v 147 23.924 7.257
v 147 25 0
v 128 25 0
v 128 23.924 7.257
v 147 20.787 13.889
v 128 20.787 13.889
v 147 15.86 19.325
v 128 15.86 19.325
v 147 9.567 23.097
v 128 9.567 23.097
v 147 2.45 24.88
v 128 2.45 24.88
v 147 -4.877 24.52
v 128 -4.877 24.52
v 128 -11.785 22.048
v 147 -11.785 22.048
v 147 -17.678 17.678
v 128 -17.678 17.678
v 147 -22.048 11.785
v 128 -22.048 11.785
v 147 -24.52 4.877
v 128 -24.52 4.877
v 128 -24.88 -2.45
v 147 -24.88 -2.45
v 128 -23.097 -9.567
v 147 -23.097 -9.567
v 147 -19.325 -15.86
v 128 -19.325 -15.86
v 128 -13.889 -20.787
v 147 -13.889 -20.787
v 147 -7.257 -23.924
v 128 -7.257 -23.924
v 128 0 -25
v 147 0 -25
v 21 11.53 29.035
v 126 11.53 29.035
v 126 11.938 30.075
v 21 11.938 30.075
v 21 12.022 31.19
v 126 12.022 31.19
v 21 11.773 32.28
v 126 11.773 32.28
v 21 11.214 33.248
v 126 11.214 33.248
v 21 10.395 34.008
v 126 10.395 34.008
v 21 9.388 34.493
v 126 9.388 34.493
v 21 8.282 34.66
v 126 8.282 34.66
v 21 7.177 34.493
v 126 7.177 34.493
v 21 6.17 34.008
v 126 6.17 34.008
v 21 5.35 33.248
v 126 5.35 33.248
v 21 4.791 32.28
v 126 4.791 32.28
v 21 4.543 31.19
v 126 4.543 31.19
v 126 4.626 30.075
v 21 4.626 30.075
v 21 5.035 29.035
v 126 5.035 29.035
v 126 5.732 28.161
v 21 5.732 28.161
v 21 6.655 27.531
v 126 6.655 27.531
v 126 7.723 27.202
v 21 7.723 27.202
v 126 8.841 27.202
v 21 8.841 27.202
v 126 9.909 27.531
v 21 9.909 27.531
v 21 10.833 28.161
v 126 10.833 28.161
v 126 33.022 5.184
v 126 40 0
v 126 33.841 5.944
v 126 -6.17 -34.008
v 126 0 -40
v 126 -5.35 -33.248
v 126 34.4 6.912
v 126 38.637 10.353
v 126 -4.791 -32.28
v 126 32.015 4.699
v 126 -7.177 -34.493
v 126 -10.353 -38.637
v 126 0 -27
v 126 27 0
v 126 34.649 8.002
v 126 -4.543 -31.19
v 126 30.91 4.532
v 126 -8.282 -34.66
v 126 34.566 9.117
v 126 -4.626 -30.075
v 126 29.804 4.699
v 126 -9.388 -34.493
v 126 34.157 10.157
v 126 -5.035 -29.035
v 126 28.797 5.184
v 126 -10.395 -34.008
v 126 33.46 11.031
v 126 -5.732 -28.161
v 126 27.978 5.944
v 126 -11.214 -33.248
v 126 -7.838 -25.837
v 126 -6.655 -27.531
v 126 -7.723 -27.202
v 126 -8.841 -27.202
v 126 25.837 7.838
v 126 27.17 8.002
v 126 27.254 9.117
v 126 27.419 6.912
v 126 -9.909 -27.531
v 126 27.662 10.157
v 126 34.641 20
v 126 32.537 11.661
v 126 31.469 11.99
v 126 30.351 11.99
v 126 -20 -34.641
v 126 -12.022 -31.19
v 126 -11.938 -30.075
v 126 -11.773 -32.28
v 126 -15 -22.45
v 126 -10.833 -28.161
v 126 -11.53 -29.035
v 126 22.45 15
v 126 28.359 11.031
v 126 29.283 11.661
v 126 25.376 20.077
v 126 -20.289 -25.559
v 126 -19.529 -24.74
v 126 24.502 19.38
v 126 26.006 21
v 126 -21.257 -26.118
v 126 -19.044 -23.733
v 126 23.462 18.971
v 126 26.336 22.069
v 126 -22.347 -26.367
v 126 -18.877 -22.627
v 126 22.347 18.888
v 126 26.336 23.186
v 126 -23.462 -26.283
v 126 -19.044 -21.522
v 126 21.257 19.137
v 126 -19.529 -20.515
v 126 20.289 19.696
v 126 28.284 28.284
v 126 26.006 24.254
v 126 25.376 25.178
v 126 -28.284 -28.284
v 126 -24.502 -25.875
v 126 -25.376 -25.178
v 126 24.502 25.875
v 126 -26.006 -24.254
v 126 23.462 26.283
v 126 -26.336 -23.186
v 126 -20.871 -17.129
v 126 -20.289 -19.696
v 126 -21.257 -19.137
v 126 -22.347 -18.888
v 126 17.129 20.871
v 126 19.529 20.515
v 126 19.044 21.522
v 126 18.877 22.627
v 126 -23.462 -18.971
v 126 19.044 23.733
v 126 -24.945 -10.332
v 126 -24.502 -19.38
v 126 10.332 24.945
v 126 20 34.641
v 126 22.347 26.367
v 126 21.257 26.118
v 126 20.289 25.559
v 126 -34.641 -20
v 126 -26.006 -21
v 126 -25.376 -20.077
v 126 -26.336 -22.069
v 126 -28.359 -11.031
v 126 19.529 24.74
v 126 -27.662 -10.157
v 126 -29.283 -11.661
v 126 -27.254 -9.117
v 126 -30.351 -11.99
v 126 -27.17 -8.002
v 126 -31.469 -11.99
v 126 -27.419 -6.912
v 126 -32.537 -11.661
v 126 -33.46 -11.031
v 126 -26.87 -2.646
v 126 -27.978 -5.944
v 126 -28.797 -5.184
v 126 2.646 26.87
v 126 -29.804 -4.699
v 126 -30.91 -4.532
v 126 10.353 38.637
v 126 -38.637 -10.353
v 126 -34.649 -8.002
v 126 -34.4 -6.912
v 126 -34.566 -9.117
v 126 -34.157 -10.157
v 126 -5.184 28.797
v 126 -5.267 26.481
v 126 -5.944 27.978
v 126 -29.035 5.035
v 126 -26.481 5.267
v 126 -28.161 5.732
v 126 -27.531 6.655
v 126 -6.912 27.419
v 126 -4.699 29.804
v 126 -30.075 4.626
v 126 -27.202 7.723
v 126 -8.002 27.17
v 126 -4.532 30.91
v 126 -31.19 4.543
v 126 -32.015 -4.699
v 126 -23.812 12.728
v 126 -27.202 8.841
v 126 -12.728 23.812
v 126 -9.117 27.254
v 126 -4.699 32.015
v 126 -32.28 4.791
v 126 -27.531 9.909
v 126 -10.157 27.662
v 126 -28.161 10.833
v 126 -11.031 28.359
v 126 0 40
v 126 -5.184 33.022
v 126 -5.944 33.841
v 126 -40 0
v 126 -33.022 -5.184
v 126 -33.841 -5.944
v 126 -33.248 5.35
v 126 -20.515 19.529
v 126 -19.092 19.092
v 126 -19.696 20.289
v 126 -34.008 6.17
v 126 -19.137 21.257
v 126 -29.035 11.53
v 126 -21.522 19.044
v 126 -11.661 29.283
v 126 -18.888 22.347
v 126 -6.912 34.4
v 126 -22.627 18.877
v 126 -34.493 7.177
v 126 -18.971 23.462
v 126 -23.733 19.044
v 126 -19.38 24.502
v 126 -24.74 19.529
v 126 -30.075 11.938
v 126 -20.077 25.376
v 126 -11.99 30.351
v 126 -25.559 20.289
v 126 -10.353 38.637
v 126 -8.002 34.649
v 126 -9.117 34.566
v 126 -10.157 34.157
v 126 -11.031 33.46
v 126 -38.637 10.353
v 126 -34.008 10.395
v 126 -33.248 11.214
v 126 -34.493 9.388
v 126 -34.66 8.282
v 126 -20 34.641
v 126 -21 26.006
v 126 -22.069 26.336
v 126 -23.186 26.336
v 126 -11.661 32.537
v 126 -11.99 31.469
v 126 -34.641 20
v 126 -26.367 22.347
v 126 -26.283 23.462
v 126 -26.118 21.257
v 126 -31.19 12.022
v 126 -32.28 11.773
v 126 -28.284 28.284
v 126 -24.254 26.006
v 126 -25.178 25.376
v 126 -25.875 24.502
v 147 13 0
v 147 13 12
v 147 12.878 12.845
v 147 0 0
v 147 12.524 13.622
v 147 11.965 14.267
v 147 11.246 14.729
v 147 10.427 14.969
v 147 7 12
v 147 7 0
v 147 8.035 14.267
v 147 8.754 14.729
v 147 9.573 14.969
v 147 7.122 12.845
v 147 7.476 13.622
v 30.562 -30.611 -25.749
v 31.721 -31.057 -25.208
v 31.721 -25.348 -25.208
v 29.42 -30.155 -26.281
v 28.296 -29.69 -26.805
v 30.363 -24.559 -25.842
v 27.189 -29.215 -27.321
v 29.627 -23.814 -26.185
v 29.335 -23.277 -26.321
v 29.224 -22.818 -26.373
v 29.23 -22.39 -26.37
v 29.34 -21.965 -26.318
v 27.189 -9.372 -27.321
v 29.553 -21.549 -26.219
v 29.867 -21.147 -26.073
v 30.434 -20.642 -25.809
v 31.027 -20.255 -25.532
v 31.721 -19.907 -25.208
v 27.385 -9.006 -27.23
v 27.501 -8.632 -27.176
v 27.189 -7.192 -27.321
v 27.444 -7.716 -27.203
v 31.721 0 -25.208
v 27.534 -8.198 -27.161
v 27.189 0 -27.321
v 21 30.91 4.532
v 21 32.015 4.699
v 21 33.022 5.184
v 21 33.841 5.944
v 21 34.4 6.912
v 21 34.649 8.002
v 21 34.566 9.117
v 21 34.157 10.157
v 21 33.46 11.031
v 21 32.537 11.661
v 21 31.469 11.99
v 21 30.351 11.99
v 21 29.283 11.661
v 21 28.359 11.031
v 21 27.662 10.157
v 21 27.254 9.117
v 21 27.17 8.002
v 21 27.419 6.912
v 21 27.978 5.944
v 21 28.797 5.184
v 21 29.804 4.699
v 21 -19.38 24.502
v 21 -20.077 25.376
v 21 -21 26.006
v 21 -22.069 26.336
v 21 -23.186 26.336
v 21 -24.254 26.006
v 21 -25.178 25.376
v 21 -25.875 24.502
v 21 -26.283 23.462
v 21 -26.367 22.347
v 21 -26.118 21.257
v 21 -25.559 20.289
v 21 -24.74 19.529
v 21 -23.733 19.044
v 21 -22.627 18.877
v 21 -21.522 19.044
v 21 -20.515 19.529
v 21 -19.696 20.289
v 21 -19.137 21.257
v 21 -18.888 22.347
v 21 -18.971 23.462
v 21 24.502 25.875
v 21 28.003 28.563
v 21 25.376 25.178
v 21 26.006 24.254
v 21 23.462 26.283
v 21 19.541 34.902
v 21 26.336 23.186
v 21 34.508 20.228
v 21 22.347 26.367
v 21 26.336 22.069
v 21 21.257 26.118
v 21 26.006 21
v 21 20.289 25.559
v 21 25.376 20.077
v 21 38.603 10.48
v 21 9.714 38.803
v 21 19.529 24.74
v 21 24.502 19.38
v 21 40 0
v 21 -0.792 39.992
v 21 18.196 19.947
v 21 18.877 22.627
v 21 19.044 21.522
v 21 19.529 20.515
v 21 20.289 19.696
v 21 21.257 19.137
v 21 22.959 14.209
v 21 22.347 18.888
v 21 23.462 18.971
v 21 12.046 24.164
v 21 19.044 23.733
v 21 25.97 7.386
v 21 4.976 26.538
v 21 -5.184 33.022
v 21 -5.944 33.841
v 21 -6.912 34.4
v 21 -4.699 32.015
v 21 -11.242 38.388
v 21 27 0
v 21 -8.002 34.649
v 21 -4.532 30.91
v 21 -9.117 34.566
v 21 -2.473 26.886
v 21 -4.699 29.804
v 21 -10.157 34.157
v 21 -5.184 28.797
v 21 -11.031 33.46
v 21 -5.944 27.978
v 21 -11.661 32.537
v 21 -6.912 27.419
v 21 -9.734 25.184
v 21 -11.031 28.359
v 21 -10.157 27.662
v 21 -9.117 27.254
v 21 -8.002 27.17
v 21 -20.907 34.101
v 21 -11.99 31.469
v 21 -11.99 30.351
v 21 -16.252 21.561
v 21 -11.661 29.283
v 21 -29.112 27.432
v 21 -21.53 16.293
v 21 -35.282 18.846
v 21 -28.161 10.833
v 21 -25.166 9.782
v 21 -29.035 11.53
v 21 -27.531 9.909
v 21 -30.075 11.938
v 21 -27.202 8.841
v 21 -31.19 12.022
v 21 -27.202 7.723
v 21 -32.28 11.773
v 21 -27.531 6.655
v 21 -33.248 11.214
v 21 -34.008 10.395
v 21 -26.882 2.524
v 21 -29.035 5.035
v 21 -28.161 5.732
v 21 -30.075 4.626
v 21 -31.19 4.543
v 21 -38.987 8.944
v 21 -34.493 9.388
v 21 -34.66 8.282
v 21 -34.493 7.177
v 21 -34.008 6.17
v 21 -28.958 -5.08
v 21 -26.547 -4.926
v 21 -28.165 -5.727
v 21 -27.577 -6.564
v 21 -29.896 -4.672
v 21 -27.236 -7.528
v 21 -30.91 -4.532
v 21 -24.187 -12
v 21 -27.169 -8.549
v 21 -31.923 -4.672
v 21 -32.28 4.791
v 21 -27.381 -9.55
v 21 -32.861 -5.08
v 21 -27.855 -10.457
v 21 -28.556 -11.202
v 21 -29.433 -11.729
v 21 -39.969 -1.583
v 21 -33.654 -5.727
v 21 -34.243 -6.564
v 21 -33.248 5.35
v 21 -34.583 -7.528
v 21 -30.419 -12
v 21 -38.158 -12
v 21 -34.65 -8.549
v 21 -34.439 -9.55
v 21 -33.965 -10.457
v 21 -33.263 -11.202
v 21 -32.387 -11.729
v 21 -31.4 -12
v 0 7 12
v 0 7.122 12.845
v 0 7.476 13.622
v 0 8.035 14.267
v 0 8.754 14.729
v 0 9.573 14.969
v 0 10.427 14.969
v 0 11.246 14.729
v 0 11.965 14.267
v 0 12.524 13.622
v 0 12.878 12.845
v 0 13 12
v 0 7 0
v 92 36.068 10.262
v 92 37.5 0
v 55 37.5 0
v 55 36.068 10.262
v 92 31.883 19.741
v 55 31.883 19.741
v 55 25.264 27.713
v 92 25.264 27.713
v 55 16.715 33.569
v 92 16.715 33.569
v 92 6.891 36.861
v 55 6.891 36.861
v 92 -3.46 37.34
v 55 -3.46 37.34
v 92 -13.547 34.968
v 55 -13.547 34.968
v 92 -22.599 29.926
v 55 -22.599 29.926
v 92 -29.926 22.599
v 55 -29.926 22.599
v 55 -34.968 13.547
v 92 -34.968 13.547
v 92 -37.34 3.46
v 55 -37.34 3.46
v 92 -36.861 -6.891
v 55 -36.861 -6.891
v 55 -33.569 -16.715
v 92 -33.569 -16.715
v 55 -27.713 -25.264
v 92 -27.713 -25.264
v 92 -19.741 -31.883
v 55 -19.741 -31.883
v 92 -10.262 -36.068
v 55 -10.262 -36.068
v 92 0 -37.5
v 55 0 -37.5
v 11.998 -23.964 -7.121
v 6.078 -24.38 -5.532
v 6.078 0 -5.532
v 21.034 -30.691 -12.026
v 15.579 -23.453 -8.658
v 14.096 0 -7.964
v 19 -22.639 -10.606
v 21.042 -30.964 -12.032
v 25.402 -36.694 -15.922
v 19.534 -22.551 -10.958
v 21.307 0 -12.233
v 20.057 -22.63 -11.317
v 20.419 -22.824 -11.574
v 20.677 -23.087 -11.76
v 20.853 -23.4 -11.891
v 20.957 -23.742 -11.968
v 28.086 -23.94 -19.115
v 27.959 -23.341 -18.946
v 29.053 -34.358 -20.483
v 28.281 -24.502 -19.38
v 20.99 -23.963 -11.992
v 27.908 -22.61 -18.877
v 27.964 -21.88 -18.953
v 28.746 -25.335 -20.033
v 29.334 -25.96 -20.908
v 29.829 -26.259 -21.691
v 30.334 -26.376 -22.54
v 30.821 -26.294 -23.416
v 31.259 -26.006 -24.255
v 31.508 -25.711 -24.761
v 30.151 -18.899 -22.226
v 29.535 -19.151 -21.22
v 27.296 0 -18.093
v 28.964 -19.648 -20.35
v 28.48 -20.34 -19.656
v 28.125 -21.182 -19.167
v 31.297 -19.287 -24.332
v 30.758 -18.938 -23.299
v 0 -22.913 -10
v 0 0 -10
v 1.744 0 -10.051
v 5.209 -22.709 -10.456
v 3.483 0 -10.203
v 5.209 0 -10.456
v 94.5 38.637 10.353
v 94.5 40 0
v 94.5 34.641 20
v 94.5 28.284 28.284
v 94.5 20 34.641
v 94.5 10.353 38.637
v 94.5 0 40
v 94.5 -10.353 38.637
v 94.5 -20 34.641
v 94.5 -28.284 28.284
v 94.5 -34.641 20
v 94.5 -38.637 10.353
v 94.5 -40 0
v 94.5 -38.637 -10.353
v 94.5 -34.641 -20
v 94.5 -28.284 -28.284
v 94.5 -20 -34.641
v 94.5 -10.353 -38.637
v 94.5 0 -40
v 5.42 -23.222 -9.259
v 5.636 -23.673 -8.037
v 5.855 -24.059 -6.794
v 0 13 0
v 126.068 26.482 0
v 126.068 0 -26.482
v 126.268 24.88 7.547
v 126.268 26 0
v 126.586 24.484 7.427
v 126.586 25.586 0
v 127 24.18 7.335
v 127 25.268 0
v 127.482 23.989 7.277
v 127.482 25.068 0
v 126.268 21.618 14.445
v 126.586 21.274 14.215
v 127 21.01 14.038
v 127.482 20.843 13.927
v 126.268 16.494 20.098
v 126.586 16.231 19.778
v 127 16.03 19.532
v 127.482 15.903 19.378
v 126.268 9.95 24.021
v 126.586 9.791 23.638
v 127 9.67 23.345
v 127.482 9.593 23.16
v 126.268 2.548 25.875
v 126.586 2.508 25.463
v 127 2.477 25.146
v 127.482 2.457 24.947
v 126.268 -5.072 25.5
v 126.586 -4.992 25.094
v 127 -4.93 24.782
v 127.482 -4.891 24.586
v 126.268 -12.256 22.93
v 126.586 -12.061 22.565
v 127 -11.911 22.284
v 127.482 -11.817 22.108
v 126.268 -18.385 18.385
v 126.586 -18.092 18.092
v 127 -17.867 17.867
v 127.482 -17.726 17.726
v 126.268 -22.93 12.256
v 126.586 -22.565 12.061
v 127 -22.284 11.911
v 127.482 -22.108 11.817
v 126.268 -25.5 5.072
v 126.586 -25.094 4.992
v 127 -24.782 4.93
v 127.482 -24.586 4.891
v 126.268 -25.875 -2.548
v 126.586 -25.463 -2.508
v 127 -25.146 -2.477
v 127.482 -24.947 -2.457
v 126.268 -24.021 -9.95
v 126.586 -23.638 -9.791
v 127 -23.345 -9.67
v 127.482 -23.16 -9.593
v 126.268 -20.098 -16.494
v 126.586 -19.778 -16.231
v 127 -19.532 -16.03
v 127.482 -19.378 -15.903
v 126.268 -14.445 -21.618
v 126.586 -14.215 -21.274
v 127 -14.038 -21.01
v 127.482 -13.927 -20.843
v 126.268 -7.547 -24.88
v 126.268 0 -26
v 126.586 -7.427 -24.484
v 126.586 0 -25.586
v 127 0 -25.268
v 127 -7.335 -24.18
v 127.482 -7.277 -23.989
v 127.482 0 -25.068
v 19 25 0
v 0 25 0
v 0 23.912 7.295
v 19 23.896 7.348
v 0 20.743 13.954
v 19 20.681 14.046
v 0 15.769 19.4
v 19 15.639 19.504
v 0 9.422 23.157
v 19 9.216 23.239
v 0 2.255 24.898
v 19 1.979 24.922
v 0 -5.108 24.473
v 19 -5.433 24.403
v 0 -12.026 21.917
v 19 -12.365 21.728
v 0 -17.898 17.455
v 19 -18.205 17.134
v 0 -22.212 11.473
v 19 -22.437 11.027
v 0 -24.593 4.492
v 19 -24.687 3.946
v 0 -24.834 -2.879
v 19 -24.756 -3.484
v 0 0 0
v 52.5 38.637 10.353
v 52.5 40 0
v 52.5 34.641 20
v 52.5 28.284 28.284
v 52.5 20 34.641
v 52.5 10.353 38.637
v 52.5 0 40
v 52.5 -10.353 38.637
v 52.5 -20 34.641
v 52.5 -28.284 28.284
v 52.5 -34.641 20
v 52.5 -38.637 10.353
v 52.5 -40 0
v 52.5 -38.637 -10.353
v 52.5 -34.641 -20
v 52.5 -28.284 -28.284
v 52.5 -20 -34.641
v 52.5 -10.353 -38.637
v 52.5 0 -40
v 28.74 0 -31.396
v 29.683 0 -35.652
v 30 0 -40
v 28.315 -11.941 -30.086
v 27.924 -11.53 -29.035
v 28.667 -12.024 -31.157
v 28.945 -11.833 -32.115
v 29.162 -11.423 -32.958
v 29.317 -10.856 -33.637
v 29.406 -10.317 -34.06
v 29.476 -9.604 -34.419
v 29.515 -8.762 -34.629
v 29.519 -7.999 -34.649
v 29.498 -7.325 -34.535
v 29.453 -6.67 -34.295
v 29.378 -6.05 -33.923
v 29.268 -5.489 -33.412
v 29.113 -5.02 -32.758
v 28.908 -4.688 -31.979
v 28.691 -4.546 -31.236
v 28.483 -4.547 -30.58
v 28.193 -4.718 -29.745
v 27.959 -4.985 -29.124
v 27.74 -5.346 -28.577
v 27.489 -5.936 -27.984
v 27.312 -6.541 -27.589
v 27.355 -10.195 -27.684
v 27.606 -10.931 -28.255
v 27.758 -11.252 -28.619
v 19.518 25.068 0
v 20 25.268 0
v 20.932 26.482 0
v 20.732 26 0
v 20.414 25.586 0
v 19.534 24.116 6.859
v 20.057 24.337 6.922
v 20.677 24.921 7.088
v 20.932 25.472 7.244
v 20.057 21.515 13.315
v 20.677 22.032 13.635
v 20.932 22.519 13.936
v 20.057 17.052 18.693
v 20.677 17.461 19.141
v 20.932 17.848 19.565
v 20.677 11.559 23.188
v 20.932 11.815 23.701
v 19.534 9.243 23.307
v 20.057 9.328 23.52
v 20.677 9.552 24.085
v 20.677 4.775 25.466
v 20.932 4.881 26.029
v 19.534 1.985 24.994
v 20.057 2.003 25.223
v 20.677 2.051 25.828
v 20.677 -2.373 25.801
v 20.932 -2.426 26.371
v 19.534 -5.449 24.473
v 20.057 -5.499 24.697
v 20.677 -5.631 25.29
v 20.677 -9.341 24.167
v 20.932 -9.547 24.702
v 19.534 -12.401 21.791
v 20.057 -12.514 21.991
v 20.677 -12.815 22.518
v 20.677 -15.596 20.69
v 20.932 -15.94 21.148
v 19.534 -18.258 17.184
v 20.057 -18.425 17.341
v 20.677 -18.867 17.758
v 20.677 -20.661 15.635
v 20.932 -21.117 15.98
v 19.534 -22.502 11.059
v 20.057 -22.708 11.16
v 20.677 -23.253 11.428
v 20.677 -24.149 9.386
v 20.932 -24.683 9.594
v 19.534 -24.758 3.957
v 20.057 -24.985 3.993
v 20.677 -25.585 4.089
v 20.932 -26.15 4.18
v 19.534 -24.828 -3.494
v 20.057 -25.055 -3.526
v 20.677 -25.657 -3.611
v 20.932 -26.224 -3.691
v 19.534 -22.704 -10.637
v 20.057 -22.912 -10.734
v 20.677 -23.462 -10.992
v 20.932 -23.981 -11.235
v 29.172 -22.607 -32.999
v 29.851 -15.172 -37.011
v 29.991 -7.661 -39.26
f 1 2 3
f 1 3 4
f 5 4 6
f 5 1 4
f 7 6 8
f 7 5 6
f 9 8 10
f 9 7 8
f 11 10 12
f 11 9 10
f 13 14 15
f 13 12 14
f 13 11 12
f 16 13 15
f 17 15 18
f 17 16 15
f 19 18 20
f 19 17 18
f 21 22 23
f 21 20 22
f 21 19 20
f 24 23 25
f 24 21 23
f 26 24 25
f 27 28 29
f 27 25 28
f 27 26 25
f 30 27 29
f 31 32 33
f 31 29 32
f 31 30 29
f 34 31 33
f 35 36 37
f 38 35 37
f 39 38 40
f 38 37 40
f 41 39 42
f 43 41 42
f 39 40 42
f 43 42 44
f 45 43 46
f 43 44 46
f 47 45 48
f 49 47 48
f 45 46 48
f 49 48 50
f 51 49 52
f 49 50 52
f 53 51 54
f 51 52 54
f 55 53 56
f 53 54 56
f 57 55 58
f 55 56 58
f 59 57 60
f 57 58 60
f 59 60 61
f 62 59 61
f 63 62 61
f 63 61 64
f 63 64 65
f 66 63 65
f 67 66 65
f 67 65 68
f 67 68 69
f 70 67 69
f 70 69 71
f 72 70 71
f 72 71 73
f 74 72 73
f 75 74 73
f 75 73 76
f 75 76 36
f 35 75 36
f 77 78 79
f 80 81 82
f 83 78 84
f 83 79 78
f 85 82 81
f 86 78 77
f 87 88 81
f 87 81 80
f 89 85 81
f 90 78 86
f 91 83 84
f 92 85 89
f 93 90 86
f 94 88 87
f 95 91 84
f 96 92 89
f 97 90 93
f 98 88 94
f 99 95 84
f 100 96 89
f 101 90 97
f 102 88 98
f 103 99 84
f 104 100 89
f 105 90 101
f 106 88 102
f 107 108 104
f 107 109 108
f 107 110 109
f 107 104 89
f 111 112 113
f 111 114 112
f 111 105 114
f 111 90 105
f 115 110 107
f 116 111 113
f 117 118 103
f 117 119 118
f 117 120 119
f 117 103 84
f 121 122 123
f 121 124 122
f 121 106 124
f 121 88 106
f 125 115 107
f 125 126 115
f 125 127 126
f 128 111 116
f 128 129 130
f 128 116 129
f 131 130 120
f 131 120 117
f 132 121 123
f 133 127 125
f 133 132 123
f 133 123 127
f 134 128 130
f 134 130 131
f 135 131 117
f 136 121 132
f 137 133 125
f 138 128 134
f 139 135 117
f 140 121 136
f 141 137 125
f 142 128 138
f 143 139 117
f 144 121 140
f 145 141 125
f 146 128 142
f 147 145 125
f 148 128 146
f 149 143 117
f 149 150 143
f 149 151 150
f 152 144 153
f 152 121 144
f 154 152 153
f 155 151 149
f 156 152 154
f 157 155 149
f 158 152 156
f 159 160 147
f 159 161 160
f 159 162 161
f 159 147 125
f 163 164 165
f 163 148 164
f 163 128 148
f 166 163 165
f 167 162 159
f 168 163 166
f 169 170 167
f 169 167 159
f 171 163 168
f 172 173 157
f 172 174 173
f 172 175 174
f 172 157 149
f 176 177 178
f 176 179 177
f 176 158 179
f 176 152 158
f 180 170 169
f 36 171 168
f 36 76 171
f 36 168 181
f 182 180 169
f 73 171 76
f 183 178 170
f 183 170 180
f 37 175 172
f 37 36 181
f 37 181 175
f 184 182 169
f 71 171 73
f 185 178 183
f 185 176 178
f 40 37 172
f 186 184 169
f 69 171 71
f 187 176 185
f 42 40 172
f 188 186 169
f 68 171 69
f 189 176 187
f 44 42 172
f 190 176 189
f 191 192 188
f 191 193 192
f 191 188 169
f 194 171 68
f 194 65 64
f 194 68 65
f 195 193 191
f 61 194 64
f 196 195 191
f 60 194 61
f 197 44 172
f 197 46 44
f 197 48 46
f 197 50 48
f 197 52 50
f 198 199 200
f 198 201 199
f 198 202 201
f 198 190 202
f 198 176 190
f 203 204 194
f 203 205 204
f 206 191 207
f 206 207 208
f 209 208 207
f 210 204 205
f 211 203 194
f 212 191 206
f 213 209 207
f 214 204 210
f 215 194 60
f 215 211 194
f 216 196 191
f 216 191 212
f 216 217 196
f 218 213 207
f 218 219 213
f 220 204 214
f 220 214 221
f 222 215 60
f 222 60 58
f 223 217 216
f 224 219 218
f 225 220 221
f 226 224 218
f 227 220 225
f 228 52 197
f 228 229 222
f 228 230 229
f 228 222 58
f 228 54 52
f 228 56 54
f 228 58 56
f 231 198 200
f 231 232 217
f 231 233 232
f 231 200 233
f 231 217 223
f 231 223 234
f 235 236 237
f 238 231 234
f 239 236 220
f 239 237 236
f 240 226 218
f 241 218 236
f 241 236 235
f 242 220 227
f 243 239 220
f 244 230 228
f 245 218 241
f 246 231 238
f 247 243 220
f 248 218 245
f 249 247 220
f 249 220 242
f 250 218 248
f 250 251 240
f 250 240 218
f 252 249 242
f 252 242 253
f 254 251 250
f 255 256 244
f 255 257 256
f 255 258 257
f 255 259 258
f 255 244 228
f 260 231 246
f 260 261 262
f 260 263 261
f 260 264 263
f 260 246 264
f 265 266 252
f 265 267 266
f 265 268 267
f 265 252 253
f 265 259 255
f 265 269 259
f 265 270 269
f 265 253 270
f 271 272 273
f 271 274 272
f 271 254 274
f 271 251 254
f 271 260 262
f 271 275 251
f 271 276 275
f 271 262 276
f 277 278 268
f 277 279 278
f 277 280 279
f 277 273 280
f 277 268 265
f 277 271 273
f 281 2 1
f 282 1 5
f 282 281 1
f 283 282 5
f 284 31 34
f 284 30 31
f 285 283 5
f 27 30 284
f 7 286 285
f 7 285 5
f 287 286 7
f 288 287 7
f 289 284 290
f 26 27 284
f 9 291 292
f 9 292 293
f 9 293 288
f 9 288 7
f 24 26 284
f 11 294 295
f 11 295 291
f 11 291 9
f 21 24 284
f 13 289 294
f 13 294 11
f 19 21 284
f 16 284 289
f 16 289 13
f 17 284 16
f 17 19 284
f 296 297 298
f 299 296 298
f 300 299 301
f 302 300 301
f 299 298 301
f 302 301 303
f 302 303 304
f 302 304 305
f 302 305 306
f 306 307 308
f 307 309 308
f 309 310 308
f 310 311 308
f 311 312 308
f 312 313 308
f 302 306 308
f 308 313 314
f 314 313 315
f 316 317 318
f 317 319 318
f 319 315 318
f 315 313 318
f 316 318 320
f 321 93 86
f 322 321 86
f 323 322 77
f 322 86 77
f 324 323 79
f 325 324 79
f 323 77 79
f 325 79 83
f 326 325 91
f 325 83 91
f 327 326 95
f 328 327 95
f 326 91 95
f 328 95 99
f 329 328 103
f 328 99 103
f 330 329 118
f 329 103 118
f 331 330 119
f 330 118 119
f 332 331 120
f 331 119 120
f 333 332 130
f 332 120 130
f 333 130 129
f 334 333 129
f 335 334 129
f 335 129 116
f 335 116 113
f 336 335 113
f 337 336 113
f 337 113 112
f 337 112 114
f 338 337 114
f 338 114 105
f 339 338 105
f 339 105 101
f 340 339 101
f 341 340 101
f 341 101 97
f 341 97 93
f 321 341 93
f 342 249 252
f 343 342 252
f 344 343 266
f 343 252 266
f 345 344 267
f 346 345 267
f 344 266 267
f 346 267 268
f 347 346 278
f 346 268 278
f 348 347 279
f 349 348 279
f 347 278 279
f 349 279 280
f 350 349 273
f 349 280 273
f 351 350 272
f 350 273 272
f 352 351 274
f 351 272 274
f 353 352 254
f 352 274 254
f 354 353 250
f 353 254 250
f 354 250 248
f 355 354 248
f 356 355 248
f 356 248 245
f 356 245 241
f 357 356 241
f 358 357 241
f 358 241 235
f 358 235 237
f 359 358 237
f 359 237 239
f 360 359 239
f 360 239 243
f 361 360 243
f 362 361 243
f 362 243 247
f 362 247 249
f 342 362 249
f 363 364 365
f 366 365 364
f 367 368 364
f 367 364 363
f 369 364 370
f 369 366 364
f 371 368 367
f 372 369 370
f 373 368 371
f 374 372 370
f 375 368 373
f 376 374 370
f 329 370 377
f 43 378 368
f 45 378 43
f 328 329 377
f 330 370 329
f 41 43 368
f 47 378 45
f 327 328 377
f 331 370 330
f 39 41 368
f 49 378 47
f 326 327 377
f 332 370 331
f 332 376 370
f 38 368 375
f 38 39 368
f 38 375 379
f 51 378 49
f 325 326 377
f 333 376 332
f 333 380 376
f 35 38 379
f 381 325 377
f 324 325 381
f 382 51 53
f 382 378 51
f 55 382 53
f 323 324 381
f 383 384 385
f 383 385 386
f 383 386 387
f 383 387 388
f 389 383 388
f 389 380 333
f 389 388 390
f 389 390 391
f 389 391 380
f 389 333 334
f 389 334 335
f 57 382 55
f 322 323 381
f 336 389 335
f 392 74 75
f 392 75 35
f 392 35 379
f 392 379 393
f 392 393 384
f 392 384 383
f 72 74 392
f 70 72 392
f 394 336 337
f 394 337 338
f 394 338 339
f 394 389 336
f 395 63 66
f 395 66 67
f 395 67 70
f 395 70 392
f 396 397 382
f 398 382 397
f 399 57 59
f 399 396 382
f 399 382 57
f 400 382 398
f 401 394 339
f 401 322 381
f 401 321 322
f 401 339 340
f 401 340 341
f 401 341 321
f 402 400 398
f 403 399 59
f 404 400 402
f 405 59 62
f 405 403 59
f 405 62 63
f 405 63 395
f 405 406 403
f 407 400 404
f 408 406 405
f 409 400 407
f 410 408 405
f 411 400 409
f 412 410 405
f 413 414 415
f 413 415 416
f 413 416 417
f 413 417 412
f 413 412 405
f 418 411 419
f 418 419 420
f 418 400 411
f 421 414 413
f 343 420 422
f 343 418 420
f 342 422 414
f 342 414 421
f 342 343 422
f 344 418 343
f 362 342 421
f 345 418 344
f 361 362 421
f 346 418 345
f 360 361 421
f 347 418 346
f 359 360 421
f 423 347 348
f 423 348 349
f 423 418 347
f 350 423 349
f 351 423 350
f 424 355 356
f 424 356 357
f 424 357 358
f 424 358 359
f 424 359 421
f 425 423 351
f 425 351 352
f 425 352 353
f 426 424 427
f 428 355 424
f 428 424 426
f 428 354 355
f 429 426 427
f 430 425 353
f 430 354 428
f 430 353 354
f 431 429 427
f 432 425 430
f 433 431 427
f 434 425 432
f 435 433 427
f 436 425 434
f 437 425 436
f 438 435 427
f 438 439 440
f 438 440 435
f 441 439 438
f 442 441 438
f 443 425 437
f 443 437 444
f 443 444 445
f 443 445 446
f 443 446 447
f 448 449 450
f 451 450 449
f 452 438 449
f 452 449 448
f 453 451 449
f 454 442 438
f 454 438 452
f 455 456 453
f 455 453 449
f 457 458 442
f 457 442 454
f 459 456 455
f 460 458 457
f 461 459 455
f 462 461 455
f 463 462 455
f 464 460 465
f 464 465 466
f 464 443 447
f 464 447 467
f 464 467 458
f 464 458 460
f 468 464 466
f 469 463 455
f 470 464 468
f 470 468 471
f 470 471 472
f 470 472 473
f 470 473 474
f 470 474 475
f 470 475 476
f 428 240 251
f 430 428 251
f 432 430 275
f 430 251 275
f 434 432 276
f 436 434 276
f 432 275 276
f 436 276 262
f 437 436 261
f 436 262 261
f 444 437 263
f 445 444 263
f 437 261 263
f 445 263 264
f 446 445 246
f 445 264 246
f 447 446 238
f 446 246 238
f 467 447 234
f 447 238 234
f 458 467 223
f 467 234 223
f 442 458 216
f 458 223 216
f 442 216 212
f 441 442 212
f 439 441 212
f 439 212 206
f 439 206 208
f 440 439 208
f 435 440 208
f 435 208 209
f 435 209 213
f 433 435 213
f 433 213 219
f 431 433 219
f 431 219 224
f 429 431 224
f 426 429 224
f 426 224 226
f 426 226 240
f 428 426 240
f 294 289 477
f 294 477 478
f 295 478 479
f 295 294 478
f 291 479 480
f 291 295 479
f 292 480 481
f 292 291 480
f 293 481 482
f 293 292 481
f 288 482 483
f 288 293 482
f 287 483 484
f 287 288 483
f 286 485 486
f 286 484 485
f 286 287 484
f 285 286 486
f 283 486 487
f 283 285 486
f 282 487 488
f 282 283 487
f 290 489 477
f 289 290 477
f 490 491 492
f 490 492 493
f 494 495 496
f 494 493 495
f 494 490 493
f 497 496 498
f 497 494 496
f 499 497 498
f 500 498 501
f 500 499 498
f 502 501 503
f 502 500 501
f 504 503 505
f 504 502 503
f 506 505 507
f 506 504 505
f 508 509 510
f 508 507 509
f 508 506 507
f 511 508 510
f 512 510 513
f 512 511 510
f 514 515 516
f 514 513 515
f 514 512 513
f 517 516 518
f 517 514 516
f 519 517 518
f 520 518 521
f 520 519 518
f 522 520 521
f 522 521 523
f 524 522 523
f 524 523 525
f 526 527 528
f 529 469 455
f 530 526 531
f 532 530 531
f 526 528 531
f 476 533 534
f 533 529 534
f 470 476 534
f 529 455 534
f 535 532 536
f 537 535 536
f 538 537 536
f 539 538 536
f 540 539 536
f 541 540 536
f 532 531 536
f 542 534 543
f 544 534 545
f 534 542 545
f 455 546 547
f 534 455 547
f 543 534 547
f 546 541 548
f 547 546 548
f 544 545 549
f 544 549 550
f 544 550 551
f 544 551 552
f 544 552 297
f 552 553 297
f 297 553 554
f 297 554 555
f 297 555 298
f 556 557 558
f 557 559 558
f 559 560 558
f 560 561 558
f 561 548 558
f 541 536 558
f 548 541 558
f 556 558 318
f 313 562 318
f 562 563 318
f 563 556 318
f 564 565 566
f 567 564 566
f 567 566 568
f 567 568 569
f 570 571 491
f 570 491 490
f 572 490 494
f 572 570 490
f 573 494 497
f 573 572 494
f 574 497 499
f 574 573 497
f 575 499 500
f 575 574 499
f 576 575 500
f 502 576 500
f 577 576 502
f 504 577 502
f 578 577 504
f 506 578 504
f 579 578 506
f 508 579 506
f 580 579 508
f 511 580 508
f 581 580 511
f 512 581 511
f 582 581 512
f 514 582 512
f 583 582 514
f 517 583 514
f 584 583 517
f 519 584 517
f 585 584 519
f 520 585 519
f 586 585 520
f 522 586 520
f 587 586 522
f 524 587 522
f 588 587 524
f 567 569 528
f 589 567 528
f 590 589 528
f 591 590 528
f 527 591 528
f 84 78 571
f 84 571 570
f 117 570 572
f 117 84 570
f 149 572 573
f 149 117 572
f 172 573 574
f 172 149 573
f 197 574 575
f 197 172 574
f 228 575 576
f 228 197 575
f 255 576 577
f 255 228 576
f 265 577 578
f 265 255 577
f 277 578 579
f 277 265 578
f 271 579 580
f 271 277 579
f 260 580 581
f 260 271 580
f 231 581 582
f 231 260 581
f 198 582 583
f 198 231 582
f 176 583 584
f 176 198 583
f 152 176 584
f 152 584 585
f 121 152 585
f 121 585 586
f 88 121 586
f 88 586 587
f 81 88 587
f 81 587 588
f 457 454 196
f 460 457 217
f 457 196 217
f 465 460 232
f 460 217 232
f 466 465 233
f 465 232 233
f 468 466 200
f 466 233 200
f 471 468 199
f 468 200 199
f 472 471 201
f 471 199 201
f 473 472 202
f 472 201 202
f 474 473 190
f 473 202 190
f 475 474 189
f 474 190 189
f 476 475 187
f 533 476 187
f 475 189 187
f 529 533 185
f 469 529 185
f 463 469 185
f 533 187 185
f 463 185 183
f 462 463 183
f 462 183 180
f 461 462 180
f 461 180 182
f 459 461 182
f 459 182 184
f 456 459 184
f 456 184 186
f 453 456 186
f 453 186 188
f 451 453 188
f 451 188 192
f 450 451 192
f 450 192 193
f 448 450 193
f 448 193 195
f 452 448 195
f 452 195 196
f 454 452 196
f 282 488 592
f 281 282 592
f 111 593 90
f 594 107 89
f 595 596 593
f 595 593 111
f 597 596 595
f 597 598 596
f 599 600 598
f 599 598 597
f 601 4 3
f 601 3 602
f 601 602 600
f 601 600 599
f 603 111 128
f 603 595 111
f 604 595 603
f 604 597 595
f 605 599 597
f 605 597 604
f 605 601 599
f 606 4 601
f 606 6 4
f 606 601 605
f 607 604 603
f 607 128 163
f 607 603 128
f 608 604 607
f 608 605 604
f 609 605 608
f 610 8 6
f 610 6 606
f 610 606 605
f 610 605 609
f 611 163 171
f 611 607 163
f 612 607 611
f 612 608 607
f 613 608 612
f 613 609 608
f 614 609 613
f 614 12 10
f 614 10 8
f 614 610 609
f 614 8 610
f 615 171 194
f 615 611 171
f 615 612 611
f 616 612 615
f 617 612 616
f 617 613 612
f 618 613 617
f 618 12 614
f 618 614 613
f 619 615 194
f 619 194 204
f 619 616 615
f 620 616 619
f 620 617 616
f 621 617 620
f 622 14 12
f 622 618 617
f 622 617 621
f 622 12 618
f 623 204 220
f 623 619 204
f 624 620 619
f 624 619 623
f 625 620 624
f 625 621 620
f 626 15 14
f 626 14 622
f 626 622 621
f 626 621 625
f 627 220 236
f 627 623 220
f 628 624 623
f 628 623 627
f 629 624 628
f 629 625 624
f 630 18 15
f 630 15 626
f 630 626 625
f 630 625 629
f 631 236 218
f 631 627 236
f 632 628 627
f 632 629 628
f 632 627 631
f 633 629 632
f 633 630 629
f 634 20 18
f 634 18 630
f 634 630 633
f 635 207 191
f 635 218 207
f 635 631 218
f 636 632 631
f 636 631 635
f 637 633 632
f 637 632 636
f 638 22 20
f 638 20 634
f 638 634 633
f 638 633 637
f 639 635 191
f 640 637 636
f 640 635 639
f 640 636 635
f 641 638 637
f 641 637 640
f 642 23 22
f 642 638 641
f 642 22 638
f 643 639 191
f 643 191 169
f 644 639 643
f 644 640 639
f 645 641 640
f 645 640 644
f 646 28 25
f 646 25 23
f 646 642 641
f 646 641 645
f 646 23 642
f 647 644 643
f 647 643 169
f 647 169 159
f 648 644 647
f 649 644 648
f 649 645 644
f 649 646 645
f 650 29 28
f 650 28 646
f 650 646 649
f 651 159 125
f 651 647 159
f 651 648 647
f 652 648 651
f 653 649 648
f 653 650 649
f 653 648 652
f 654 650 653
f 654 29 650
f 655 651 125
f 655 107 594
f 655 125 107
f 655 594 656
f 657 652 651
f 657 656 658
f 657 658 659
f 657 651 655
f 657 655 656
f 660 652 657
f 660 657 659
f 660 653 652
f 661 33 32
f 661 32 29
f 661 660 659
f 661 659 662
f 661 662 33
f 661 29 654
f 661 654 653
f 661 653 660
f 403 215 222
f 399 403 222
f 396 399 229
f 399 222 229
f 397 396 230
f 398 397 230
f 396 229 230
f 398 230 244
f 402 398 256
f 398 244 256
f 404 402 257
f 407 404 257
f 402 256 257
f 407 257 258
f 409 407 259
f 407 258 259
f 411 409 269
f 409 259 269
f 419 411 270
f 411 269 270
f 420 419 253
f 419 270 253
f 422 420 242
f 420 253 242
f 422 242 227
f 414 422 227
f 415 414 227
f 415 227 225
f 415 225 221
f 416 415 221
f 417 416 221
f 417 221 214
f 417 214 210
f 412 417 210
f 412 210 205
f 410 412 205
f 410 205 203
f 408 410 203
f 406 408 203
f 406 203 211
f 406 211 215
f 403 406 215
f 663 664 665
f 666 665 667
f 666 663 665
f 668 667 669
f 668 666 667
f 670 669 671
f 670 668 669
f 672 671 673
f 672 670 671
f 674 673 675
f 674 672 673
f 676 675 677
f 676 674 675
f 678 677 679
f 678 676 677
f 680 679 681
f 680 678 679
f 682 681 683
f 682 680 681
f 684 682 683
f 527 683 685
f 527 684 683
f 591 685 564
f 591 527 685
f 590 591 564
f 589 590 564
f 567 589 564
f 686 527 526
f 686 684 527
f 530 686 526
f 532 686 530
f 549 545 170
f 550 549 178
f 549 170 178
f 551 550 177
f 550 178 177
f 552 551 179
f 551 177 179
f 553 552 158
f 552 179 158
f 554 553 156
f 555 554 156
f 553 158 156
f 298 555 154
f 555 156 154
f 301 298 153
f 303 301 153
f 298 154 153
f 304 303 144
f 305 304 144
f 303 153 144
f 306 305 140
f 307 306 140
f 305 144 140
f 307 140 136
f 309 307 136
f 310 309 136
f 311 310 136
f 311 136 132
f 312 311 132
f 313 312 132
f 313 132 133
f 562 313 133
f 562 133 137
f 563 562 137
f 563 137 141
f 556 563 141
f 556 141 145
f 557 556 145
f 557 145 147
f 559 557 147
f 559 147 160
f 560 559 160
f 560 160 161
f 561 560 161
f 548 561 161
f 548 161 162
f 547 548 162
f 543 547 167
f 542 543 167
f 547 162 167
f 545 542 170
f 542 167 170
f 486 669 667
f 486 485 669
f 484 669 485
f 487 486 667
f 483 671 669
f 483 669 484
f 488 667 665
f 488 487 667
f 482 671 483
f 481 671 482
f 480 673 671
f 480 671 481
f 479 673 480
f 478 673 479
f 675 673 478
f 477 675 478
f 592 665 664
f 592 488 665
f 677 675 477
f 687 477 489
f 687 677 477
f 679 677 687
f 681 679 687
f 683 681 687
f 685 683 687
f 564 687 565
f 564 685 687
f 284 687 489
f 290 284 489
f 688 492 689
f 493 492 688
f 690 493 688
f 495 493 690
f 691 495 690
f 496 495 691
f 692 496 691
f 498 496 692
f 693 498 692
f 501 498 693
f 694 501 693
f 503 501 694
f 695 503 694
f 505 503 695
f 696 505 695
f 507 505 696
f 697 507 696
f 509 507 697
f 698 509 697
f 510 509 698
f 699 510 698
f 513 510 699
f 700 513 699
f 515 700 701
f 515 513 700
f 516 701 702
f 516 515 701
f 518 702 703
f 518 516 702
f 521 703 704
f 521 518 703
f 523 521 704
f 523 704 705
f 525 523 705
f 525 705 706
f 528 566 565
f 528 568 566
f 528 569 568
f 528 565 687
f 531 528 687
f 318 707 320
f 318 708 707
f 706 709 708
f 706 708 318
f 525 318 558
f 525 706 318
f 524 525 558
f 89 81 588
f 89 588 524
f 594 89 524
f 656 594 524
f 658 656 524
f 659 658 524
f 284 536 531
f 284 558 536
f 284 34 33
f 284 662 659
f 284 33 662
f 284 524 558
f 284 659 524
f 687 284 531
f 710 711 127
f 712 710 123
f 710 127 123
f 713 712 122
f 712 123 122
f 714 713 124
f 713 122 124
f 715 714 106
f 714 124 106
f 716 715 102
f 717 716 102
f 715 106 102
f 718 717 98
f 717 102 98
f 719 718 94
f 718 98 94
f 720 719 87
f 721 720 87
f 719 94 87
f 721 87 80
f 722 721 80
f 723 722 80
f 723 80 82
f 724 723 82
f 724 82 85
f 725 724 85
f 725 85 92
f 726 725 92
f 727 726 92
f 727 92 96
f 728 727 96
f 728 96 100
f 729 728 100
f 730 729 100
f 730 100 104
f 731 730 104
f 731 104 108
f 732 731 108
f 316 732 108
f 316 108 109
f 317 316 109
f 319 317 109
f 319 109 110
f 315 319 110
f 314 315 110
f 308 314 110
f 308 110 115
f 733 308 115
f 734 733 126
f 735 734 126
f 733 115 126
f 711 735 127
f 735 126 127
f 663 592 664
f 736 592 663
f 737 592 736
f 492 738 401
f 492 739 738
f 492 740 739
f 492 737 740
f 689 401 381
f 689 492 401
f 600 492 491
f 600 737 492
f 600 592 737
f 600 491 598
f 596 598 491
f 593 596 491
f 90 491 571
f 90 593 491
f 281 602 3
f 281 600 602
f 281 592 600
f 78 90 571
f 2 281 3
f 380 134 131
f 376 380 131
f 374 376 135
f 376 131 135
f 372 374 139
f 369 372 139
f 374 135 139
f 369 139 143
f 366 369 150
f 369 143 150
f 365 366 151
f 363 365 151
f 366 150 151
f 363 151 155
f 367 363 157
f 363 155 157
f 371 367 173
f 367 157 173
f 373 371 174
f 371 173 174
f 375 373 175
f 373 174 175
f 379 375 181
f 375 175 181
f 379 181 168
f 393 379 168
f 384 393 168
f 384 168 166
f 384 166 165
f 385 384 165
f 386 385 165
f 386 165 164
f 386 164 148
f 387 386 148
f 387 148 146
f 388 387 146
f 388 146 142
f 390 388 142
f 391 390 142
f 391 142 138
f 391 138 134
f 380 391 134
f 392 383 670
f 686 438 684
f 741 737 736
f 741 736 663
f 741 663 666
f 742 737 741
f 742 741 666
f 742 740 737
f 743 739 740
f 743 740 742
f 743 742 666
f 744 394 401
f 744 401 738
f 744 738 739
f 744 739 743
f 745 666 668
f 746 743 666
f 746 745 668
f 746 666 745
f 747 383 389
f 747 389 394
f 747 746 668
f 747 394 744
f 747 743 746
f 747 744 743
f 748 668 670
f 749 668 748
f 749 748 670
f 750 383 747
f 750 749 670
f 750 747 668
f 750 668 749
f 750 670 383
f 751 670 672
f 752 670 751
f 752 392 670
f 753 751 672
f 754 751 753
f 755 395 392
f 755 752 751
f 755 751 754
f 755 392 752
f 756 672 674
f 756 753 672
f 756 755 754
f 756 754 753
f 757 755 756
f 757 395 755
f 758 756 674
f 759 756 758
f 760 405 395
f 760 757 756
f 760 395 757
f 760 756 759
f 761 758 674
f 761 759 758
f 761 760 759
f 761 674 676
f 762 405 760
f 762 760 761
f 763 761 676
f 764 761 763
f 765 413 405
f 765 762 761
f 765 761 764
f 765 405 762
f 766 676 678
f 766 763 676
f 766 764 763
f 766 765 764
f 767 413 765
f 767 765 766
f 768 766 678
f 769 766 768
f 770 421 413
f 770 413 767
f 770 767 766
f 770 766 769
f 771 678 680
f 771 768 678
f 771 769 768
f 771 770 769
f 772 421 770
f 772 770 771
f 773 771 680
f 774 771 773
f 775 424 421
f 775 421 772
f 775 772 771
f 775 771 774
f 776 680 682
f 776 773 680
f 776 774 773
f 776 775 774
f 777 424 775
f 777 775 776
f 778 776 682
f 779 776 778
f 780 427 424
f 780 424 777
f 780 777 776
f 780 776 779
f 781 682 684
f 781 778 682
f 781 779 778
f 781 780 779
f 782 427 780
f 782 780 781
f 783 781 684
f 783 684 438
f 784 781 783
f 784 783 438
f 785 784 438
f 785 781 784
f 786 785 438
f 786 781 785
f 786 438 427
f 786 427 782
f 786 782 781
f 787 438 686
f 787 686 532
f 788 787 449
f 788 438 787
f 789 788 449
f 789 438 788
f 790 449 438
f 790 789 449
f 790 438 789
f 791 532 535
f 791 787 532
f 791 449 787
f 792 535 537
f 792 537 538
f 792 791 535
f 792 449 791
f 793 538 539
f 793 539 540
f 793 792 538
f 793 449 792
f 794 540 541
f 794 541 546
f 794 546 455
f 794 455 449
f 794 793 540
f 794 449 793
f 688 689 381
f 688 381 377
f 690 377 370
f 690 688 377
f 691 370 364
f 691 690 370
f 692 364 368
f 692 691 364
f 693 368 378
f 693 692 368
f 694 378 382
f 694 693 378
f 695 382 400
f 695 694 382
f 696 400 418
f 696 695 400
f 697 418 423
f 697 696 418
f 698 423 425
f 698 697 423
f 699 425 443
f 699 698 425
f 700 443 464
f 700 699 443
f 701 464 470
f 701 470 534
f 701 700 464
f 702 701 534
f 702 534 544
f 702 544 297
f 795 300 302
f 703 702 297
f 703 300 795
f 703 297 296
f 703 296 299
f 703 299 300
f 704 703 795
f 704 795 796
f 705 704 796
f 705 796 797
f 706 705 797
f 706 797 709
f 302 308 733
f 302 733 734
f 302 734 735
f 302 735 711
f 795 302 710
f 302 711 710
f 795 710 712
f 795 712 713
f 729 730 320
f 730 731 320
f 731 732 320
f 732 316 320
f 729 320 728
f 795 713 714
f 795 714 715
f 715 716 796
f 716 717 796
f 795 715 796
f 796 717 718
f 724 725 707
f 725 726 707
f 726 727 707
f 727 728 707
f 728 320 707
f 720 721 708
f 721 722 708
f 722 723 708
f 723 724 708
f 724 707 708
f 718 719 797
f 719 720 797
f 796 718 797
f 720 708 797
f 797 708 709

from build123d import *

# Parameters (mm, degrees)
CONG_1_R                     = 2
ENL_V_MAT_EXTRU_1_DEPTH      = 158.508729917
ENL_V_MAT_EXTRU_2_DEPTH      = 158.508729917
ESQUISSE6_R                  = 3.75
ENL_V_MAT_EXTRU_4_DEPTH      = 139.115893365
R_P_TITION_CIRCULAIRE1_COUNT = 9
R_P_TITION_CIRCULAIRE1_ANGLE = 240
ENL_V_MAT_EXTRU_5_DEPTH      = 80


with BuildPart() as part:
    # Esquisse1 → Révolution1 (revolve)
    with BuildSketch(Plane.XY, mode=Mode.PRIVATE) as r_volution1_sk:
        Polygon((0, 0), (0, 25), (21, 25), (21, 40), (52.5, 40), (55, 37.5), (92, 37.5), (94.5, 40), (126, 40), (126, 25), (147, 25), (147, 0), align=None)
    revolve(r_volution1_sk.sketch.rotate(Axis((0, 0, 0), (1, 0, 0)), 90), axis=Axis((0, 0, 0), (1, 0, 0)))

    # Congé1
    cong_1_edges = [part.edges().sort_by_distance(p)[0] for p in [
        (126, 0, -25),
        (21, 0, -25),
    ]]
    fillet(cong_1_edges, radius=CONG_1_R)

    # Esquisse3 → Enlèv. mat.-Extru.1 (cut, through all)
    with BuildSketch(Plane(origin=(147, 0, 0), x_dir=(0, 0, -1), z_dir=(1, 0, 0))):
        with BuildLine():
            Line((0, 0), (0, 40))
            ThreePointArc((0, 40), (28.284271247, 28.284271247), (40, 0))
            Line((40, 0), (0, 0))
        make_face()
    extrude(amount=-ENL_V_MAT_EXTRU_1_DEPTH, mode=Mode.SUBTRACT)

    # Esquisse4 → Enlèv. mat.-Extru.2 (cut, through all)
    with BuildSketch(Plane(origin=(147, 0, 0), x_dir=(0, 0, -1), z_dir=(1, 0, 0))):
        with BuildLine():
            Line((12, 7), (-12, 7))
            ThreePointArc((-12, 7), (-15, 10), (-12, 13))
            Line((-12, 13), (12, 13))
            ThreePointArc((12, 13), (15, 10), (12, 7))
        make_face()
    extrude(amount=-ENL_V_MAT_EXTRU_2_DEPTH, mode=Mode.SUBTRACT)

    # Esquisse6 → Enlèv. mat.-Extru.4 (cut, through all)
    with BuildSketch(Plane(origin=(126, 0, 0), x_dir=(0, 0, -1), z_dir=(1, 0, 0))):
        with Locations((-8.282209443, 30.909626441)):
            Circle(ESQUISSE6_R)
    enl_v_mat_extru_4 = extrude(amount=-ENL_V_MAT_EXTRU_4_DEPTH, mode=Mode.SUBTRACT)

    # Répétition circulaire1: Enlèv. mat.-Extru.4 ×9 about axis
    r_p_tition_circulaire1_axis = Axis((0, 0, 0), (1, 0, 0))
    for i in range(1, R_P_TITION_CIRCULAIRE1_COUNT):
        add(enl_v_mat_extru_4.rotate(r_p_tition_circulaire1_axis, i * R_P_TITION_CIRCULAIRE1_ANGLE / (R_P_TITION_CIRCULAIRE1_COUNT - 1)), mode=Mode.SUBTRACT)

    # Esquisse7 → Enlèv. mat.-Extru.5 (cut)
    with BuildSketch(Plane(origin=(0, 0, 0), x_dir=(1, 0, 0), z_dir=(0, 1, 0))):
        with BuildLine():
            Line((30, 40), (0, 40))
            Line((0, 40), (0, 10))
            ThreePointArc((0, 10), (2.614672282, 10.114159057), (5.20944533, 10.45576741))
            Line((5.20944533, 10.45576741), (6.077686218, 5.531728645))
            ThreePointArc((6.077686218, 5.531728645), (21.306650015, 12.23263309), (31.720772546, 25.208360839))
            Line((31.720772546, 25.208360839), (27.189233611, 27.321452148))
            ThreePointArc((27.189233611, 27.321452148), (29.288880214, 33.506811582), (30, 40))
        make_face()
    extrude(amount=-ENL_V_MAT_EXTRU_5_DEPTH, mode=Mode.SUBTRACT)


solid = part.part
